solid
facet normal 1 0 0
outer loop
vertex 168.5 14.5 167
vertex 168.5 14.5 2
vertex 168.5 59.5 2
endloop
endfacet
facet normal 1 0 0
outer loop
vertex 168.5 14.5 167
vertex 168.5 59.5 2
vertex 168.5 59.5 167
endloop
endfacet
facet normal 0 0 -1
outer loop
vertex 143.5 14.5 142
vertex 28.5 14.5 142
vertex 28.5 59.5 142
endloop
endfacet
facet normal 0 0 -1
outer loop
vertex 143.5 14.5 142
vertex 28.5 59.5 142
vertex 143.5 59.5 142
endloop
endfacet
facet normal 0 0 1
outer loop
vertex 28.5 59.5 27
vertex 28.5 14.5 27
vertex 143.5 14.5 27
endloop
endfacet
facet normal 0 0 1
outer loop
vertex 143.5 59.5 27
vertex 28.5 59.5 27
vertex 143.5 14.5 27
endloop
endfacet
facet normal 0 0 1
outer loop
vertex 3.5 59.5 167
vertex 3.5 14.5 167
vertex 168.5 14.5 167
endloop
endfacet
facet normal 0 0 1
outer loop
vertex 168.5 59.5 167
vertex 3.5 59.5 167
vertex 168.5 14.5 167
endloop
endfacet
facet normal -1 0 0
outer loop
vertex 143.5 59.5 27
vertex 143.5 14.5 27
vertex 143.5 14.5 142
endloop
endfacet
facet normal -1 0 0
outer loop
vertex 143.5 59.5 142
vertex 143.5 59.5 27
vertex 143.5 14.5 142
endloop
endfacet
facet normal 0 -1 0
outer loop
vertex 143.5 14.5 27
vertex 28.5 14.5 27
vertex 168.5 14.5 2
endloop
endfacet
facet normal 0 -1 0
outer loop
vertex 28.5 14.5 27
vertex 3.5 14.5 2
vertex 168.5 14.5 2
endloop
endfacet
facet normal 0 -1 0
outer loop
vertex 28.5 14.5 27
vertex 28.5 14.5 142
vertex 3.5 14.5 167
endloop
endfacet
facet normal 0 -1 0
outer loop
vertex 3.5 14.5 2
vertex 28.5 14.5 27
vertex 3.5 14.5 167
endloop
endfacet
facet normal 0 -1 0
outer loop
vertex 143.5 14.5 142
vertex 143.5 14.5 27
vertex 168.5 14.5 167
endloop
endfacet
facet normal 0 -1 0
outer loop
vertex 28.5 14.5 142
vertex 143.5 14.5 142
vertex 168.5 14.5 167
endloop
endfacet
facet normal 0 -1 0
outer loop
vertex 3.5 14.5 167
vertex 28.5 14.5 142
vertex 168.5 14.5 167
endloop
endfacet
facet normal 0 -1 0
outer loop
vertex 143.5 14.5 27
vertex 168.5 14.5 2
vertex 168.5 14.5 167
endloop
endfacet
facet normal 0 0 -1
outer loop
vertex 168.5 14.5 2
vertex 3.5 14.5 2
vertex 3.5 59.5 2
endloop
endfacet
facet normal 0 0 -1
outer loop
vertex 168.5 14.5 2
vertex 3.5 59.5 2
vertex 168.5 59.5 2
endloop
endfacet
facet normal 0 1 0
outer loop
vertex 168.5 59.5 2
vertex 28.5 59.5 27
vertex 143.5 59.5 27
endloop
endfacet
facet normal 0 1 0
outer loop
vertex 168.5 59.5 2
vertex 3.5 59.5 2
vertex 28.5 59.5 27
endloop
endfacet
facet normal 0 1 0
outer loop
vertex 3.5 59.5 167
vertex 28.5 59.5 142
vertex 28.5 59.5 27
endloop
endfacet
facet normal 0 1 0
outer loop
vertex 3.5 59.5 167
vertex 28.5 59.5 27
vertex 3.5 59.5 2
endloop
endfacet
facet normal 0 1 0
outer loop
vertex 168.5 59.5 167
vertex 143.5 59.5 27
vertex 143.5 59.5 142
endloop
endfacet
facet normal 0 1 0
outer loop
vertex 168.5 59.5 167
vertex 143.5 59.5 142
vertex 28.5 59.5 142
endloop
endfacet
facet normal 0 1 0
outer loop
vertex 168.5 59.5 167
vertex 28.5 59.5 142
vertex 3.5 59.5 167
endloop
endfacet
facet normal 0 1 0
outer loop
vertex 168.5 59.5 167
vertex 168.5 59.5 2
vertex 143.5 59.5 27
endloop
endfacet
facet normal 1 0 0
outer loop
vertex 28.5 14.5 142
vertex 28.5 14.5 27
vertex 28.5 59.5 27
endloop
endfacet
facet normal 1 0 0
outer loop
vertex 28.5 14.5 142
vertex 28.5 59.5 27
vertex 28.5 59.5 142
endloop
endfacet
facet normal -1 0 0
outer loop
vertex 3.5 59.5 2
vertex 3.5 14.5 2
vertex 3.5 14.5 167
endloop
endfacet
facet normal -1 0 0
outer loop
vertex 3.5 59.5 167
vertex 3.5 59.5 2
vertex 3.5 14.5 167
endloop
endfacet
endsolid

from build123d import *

# Parameters (mm, degrees)
BOX017_W               = 115
BOX017_H               = 115
BOX017_DEPTH           = 60
BOX016_W               = 165
BOX016_H               = 165
BOX016_DEPTH           = 45
CUT004_PITCH_ANGLE     = -90
CUT004_PLACEMENT_ANGLE = -90


with BuildPart() as cube013:
    # Box017 → Box017 (new body)
    with BuildSketch(Plane(origin=(25, 25, -7), x_dir=(1, 0, 0), z_dir=(0, 0, 1))):
        with Locations((57.5, 57.5)):
            Rectangle(BOX017_W, BOX017_H)
    extrude(amount=BOX017_DEPTH)


with BuildPart() as bellows:
    # Box016 → Box016 (new body)
    with BuildSketch(Plane.XY):
        with Locations((82.5, 82.5)):
            Rectangle(BOX016_W, BOX016_H)
    extrude(amount=BOX016_DEPTH)

    # Cut004: cut Cube013
    add(cube013.part, mode=Mode.SUBTRACT)


with BuildPart() as bellows_1:
    # Cut004 pitch: moved
    add(bellows.part.rotate(Axis((0, 0, 0), (0, 1, 0)), CUT004_PITCH_ANGLE))


with BuildPart() as bellows_2:
    # Cut004 placement: moved
    add(bellows_1.part.moved(Location((3.5, 14.5, 2))).rotate(Axis((3.5, 14.5, 2), (0, 0, 1)), CUT004_PLACEMENT_ANGLE))


solid = bellows_2.part
